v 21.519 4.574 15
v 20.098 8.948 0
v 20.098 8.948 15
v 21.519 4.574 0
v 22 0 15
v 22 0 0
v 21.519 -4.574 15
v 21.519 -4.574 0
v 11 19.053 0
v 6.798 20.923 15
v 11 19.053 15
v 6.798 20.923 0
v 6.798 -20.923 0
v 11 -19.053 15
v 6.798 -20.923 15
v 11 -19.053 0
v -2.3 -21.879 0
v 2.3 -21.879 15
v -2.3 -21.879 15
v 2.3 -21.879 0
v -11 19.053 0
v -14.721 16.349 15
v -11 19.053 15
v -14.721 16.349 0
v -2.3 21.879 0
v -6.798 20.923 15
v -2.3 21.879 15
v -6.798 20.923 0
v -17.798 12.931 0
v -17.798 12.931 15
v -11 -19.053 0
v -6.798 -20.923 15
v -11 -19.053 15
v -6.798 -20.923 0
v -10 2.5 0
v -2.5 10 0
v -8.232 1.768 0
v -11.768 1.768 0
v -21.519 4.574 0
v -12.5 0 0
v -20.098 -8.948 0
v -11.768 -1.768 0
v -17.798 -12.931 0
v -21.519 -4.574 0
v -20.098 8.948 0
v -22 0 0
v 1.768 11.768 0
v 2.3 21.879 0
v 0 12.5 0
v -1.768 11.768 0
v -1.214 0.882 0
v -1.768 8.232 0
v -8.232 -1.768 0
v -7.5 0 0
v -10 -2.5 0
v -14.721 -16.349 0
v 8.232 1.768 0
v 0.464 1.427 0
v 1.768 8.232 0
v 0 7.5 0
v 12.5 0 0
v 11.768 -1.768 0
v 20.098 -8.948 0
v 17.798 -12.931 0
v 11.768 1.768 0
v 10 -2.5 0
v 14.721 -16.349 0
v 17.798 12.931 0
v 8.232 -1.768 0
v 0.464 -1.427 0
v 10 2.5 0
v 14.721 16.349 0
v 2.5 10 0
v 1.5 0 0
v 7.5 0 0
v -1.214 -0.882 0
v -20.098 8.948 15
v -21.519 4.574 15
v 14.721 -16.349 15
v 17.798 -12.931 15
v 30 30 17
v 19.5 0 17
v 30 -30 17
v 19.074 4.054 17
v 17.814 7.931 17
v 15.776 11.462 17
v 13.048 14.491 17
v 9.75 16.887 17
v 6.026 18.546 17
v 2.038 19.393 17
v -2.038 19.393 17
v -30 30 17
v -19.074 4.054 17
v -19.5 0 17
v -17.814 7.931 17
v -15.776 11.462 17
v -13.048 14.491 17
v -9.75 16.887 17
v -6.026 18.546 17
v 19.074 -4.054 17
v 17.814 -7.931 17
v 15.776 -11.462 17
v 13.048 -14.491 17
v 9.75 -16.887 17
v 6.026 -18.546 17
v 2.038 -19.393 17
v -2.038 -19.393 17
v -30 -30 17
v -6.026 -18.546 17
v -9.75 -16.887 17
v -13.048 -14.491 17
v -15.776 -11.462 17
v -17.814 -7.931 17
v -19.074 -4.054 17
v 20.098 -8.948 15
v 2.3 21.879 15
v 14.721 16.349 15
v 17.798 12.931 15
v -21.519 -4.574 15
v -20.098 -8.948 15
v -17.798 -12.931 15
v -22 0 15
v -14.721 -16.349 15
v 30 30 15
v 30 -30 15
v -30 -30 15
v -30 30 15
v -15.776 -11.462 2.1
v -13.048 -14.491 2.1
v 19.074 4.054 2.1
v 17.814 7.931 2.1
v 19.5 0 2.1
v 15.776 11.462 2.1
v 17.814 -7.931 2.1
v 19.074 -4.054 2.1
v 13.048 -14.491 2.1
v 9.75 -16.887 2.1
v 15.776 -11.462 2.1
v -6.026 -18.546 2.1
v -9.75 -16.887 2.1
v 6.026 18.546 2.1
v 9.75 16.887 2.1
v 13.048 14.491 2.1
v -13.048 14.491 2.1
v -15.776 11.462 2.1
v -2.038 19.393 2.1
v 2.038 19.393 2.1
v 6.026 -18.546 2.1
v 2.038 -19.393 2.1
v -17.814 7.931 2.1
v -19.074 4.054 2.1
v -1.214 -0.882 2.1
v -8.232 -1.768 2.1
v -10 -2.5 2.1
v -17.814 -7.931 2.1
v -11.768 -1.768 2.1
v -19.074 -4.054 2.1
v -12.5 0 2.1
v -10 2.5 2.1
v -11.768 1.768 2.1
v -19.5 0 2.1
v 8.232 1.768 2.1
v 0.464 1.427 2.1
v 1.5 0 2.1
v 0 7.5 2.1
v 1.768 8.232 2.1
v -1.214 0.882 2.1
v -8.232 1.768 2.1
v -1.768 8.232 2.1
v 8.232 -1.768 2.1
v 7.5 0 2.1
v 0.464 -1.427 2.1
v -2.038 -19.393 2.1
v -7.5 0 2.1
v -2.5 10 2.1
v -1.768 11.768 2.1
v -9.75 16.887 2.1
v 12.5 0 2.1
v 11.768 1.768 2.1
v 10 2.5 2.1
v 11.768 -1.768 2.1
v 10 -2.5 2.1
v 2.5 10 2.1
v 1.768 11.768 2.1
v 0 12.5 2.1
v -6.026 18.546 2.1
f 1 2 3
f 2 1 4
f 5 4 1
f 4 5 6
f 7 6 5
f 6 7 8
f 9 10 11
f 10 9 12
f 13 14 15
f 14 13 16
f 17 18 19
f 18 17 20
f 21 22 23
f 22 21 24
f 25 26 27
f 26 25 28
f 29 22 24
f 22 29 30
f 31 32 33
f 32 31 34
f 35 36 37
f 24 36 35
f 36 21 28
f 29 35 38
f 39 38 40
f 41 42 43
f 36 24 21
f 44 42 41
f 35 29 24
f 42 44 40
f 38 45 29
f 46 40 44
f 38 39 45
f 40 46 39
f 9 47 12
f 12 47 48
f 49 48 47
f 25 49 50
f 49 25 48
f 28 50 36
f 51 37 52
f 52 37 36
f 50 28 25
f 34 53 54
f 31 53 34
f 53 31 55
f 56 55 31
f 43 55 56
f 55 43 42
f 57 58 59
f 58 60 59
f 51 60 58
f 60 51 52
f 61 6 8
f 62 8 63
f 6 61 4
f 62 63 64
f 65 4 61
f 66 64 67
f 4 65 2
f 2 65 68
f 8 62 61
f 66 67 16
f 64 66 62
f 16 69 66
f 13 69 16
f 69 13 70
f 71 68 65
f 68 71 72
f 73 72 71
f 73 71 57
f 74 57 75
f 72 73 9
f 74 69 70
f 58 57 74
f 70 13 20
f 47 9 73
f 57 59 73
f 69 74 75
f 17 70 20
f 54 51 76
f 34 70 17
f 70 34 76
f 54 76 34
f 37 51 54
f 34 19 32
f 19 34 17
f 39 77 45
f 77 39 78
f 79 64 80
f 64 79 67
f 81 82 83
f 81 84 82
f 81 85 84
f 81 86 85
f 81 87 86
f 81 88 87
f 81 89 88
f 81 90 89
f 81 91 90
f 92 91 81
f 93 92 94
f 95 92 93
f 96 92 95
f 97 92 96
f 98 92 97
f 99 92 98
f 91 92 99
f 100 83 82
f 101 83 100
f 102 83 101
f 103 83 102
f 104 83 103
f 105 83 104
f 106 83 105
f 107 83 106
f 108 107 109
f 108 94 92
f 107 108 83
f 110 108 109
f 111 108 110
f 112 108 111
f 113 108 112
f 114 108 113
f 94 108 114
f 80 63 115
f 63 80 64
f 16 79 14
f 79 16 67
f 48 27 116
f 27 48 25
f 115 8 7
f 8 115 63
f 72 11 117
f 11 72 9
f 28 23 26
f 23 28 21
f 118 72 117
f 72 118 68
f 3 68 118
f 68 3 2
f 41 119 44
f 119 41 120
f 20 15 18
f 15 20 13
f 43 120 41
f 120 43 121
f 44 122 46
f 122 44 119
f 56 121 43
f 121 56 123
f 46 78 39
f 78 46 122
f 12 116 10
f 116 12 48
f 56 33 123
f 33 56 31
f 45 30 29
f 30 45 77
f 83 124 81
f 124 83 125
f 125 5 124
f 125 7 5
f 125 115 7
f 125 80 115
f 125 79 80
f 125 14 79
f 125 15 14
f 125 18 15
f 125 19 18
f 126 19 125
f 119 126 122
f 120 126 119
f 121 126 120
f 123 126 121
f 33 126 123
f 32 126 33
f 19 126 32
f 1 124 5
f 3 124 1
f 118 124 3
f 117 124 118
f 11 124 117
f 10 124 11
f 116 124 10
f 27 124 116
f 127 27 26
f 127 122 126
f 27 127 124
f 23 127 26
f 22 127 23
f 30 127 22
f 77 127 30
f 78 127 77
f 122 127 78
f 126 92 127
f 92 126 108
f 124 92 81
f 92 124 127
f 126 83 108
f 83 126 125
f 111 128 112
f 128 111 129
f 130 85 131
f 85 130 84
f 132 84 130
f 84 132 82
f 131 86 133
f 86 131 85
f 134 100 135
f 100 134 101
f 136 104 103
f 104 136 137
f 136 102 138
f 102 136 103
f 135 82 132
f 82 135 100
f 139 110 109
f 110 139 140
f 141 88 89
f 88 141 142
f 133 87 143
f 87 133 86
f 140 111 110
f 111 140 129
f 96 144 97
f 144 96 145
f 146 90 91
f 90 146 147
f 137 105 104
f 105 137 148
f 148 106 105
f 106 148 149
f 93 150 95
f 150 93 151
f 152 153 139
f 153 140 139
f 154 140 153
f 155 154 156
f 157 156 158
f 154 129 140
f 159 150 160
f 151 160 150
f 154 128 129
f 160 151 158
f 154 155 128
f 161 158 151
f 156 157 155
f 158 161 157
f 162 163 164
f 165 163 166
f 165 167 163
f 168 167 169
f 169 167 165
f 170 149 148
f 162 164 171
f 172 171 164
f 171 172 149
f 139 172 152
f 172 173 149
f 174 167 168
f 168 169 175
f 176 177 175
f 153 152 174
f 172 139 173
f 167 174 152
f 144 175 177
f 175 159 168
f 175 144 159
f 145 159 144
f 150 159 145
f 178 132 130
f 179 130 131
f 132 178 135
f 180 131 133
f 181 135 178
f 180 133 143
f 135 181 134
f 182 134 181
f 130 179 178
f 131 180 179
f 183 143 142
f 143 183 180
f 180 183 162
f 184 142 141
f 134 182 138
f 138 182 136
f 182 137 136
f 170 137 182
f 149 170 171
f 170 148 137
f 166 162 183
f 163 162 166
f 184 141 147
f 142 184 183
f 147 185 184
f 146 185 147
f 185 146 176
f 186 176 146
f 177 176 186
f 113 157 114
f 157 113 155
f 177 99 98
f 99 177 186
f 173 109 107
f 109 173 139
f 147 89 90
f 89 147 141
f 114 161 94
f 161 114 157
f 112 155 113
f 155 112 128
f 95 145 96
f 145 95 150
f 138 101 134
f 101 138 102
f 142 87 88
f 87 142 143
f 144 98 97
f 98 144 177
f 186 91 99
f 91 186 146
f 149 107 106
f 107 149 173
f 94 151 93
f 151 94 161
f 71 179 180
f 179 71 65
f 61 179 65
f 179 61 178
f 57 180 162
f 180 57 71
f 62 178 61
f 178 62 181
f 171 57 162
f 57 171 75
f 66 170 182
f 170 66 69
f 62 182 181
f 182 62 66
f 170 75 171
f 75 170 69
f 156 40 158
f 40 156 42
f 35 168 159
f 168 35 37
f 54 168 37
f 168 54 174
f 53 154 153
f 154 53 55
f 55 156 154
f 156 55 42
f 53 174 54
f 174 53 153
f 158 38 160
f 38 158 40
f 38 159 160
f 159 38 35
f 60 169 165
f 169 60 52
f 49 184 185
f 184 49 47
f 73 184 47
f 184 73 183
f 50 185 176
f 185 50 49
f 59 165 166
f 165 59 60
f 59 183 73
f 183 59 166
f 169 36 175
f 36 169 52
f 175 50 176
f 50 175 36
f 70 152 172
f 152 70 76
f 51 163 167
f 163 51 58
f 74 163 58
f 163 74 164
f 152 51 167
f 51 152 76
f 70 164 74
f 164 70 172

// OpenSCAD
module faceplate(){
   difference(){
      starting_block();
      translate([0,0,2.1])cylinder(15,19.5,19.5);   
      translate([10,0,-0.1])cylinder(3,2.5,2.5);
      translate([-10,0,-0.1])cylinder(3,2.5,2.5);
      translate([0,10,-0.1])cylinder(3,2.5,2.5);
      translate([0,0,-0.1])cylinder(3,1.5,1.5);
   }
}
module starting_block(){
   union (){
      cylinder(17,22,22);
      translate([-30,-30,15])cube([60,60,2]);
   }
}

faceplate();
